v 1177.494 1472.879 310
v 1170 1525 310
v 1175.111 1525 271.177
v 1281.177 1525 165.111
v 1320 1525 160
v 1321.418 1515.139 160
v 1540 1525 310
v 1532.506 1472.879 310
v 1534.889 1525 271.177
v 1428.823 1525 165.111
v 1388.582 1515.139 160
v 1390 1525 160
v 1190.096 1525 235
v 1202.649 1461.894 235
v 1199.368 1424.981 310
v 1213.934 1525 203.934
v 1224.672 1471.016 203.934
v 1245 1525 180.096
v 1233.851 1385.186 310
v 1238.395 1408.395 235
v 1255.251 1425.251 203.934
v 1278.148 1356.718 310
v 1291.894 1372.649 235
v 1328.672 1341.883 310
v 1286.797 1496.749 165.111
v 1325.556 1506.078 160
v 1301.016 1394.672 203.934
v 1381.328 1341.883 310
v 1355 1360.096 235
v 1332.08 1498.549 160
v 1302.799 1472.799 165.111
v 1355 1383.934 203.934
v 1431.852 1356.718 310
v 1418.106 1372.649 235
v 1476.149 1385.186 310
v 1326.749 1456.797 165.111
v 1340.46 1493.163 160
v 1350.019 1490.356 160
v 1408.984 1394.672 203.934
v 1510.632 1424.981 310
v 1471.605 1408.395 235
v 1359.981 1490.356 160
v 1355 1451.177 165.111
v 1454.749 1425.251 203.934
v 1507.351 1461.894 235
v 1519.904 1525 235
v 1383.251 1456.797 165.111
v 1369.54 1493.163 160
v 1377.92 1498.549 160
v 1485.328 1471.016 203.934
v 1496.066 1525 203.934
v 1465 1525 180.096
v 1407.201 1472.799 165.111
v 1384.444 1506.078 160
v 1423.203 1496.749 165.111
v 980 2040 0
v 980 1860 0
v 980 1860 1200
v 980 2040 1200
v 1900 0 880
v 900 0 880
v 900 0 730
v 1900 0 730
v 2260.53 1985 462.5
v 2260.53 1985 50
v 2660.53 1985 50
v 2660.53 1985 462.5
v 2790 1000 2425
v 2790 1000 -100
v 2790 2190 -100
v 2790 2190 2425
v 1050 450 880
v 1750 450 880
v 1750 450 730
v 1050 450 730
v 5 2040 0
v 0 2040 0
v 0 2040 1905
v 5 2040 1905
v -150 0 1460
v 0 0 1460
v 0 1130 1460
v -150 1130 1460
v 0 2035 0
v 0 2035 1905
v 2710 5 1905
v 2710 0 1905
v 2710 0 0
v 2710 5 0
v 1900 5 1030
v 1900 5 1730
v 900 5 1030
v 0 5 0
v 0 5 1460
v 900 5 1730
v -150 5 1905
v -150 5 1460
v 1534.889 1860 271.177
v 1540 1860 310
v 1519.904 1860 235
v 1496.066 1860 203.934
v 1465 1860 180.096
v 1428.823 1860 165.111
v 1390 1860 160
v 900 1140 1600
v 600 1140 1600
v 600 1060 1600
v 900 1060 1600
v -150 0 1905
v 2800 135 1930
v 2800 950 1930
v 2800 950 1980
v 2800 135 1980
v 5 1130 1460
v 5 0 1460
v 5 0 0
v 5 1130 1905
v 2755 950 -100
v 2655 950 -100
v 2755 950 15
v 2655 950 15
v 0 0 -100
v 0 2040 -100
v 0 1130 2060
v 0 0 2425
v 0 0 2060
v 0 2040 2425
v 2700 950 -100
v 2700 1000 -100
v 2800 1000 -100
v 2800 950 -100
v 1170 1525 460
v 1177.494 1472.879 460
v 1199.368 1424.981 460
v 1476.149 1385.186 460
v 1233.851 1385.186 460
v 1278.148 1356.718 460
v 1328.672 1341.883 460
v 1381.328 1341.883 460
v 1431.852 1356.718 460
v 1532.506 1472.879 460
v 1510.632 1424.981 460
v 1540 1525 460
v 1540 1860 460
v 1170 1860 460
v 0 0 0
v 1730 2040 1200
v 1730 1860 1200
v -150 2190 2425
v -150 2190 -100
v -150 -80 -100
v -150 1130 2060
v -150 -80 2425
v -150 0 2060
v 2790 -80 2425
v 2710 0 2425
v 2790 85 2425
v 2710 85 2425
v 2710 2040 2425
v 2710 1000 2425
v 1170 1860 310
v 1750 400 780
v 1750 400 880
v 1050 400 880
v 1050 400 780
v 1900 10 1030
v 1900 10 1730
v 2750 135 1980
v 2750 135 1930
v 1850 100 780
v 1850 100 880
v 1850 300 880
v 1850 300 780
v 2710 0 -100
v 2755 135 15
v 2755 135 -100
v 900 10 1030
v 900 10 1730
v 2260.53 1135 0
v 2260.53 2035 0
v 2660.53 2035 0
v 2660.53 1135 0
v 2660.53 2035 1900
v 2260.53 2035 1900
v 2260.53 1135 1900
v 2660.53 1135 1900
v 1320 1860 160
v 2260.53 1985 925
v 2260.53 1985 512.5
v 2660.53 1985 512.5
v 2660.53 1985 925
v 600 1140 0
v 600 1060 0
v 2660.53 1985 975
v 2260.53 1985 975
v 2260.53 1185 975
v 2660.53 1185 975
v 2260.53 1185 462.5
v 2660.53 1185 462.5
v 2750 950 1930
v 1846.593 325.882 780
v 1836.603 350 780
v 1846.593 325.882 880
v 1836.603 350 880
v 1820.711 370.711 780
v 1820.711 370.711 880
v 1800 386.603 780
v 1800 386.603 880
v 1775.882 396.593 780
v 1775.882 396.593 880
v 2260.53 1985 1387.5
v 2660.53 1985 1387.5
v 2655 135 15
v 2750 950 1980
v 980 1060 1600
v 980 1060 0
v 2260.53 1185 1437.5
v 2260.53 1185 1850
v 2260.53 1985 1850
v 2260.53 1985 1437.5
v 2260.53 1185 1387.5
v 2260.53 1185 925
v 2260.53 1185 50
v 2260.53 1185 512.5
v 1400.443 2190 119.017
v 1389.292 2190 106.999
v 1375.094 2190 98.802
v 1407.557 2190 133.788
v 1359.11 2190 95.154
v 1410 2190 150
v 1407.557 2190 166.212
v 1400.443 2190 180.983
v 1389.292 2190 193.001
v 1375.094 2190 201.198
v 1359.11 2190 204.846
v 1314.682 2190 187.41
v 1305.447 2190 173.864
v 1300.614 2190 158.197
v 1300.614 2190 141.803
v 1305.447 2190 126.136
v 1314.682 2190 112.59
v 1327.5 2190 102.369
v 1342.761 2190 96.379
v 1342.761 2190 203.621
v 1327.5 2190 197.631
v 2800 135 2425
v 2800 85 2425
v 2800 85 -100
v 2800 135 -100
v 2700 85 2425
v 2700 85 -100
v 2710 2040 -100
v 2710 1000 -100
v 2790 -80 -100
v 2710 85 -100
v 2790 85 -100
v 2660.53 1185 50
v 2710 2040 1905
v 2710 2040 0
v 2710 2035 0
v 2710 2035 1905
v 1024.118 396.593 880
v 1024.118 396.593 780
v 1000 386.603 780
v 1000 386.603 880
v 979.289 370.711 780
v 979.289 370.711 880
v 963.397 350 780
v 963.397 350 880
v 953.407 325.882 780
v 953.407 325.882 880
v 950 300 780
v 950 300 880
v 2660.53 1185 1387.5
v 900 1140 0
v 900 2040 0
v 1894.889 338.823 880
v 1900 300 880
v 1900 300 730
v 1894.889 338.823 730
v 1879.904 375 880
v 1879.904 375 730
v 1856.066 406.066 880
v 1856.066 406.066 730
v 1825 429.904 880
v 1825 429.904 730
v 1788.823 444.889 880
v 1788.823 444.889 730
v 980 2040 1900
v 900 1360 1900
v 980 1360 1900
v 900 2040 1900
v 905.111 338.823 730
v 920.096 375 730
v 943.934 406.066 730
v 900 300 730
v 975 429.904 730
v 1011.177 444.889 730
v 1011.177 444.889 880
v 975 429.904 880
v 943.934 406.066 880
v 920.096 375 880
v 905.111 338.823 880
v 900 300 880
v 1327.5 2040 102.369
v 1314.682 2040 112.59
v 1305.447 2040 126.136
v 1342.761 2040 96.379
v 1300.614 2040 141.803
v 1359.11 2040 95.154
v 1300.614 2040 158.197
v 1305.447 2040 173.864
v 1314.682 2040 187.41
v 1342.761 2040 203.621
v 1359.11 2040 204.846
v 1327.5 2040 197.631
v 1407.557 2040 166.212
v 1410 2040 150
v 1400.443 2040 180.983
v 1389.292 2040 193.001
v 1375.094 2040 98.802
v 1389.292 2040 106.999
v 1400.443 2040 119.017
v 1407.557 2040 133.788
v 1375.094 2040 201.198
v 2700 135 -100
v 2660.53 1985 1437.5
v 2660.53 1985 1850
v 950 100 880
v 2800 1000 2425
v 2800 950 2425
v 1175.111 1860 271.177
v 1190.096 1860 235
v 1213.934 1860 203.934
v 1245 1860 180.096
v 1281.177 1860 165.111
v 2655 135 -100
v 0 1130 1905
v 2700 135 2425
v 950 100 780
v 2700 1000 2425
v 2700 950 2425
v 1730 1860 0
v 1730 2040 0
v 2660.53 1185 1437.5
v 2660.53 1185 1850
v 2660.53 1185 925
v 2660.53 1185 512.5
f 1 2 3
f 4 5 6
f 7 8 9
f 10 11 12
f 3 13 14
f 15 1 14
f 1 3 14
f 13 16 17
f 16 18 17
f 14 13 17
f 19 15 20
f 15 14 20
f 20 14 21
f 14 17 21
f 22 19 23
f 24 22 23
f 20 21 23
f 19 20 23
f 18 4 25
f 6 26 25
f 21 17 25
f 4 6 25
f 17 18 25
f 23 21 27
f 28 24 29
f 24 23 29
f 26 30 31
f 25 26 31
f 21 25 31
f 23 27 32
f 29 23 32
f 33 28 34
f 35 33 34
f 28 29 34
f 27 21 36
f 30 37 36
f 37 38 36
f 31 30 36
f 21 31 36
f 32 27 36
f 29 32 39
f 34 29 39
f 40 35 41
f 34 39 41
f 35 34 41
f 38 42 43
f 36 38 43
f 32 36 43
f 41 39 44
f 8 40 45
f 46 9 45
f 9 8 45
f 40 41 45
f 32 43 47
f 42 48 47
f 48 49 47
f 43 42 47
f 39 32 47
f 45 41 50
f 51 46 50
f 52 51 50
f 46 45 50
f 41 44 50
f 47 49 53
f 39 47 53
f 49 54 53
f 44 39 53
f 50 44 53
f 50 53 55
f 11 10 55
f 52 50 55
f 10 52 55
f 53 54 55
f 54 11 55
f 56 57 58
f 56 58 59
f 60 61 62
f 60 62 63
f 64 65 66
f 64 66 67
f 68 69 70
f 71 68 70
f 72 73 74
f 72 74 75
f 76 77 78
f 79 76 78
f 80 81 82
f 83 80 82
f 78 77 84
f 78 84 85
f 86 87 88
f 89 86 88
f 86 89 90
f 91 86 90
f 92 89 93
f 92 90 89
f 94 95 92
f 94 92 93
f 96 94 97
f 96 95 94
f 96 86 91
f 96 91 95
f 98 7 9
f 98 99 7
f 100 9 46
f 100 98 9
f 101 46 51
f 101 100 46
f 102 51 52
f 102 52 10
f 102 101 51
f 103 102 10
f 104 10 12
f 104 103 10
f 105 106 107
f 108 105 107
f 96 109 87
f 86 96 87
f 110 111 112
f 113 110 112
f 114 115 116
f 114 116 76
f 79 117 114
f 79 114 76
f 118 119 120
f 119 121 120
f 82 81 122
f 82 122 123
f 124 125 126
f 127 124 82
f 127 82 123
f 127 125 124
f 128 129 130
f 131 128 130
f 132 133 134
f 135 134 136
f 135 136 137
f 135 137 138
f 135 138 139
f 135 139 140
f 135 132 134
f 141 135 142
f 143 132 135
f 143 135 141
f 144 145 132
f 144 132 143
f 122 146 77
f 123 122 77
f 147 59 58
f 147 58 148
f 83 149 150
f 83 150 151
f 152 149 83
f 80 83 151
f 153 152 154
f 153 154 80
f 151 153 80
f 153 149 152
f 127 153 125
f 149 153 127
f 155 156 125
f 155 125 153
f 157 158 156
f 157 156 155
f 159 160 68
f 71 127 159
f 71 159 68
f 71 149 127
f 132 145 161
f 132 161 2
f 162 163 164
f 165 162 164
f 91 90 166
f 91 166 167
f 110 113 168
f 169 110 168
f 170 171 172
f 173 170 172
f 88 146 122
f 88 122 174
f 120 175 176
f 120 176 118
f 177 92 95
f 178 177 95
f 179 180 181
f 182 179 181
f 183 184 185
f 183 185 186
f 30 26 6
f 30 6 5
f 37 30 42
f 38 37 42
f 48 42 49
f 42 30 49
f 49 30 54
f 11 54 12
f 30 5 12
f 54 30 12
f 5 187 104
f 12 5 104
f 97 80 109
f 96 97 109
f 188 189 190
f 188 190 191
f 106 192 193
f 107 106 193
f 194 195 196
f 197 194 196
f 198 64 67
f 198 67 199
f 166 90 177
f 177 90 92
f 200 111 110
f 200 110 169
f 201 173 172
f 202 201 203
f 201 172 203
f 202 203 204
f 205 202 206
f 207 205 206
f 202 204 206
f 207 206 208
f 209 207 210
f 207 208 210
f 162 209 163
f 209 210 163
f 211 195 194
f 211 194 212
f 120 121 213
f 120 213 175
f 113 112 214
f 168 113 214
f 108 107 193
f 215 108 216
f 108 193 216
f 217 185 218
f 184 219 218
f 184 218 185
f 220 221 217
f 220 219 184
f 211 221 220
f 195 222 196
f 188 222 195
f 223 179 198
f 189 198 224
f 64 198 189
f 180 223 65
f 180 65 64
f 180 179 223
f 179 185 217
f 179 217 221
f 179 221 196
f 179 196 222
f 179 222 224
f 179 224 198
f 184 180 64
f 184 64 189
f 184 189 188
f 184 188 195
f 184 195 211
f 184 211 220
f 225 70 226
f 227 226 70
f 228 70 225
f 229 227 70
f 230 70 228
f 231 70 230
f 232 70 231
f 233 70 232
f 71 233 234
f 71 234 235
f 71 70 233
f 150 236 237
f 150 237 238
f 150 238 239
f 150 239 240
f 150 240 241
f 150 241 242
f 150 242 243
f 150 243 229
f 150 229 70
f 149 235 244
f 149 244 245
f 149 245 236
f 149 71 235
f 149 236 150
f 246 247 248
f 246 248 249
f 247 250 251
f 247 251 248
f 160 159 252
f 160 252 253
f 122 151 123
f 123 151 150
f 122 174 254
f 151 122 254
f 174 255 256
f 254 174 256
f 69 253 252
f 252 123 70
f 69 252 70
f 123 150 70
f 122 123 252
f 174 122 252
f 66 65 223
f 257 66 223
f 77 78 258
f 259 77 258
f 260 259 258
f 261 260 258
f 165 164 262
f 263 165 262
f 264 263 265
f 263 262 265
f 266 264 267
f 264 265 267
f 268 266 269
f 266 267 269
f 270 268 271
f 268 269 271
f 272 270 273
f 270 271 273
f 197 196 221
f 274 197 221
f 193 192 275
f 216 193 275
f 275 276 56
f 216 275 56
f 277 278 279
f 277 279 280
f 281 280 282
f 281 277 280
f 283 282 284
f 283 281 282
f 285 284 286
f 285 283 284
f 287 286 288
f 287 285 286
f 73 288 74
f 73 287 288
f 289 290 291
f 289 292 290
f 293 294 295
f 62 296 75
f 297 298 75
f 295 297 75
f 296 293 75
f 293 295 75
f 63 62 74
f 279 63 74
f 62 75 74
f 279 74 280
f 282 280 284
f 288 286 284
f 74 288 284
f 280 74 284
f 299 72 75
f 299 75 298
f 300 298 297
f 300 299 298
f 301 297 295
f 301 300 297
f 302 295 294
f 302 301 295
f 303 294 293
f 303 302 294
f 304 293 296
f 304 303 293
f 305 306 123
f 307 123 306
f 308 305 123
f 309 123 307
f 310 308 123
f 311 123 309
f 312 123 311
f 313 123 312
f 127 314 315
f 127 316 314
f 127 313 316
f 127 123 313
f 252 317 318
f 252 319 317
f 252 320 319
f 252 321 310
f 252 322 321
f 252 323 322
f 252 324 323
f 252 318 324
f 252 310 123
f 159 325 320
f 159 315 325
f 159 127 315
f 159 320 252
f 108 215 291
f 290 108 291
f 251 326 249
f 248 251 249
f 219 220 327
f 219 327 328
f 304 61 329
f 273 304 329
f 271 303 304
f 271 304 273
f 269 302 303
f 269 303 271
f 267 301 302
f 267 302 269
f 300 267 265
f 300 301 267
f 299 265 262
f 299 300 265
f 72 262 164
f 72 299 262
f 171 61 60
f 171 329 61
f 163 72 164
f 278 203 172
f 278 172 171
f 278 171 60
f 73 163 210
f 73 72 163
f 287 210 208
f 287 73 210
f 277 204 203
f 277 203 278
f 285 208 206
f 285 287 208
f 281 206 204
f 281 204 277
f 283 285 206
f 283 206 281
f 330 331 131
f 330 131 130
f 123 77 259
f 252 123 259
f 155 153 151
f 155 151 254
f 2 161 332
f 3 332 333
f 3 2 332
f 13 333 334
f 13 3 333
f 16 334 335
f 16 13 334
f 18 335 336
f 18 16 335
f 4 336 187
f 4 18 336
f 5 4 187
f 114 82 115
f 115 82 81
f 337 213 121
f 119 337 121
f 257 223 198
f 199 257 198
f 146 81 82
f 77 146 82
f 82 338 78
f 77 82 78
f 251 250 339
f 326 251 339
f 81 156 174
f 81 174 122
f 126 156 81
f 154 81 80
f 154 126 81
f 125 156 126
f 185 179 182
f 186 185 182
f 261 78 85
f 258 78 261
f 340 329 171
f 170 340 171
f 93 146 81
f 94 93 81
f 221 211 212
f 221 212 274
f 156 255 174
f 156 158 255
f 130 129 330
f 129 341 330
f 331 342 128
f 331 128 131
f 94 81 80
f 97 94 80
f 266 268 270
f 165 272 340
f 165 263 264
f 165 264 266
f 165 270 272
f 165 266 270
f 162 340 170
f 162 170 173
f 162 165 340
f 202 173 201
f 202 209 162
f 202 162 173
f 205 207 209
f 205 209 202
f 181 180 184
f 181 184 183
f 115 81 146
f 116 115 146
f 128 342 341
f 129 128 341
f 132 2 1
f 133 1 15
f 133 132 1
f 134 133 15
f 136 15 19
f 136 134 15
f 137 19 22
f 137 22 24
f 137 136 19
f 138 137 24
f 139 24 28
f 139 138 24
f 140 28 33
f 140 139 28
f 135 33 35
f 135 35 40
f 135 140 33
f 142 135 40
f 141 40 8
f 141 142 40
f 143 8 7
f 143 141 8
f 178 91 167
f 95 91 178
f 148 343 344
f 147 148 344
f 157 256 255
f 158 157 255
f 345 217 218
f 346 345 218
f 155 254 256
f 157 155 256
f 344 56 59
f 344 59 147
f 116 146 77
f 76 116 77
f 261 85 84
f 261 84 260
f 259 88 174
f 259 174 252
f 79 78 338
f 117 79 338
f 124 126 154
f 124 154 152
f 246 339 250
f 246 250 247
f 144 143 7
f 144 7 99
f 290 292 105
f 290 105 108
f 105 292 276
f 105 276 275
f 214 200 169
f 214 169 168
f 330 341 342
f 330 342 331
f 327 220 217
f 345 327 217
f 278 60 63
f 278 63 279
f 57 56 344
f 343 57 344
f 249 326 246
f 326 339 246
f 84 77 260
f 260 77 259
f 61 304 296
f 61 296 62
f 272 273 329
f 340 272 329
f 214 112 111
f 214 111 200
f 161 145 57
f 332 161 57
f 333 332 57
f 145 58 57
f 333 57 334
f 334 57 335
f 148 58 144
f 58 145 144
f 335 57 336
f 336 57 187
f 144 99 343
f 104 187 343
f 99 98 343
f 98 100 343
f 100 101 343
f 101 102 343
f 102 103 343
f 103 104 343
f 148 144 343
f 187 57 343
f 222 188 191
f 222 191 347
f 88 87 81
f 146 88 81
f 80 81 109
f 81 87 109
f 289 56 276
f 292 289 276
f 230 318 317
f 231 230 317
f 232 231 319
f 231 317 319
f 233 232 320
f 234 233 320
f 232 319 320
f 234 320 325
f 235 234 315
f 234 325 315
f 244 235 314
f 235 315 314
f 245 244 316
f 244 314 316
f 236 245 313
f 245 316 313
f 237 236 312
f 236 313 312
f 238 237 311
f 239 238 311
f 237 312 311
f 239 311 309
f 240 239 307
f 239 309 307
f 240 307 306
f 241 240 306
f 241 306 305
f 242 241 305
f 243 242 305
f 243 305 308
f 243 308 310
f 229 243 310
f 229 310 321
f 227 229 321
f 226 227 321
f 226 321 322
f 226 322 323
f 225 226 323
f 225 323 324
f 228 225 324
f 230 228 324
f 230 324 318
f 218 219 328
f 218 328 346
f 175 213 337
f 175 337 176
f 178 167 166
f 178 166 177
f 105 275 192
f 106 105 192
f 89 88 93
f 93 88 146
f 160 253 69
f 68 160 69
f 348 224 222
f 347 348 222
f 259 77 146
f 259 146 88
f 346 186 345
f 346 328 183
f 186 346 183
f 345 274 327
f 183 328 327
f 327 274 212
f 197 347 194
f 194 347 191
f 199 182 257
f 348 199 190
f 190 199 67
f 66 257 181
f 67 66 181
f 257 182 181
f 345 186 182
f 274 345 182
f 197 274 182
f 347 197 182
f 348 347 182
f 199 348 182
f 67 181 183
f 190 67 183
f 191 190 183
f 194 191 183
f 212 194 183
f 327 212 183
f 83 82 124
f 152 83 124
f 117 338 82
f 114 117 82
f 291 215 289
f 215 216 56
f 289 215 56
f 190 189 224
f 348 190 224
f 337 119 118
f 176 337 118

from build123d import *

# Parameters (mm, degrees)
F0_W           = 2710
F0_H           = 2040
F1_DEPTH       = 100
F3_DEPTH       = 2425
F3_DEPTH_BACK  = 100
F4_W           = 1130
F4_H           = 600
F5_DEPTH       = 150.001
F6_W           = 100
F6_H           = 50
F7_DEPTH       = 2425
F7_DEPTH_BACK  = 100
F8_W           = 50
F8_H           = 50
F9_DEPTH       = 815
F10_W          = 100
F10_H          = 815
F11_DEPTH      = 15
F11_DEPTH_BACK = 100
F14_DEPTH      = 5
F16_DEPTH      = 5
F17_W          = 2710
F17_H          = 1905
F18_DEPTH      = 5
F19_R          = 55
F20_DEPTH      = 150.001
F21_W          = 750
F21_H          = 180
F22_DEPTH      = 1200
F24_DEPTH      = 1900
F26_DEPTH      = 380
F28_DEPTH      = 300
F31_DEPTH      = 300
F32_R          = 150
F35_DEPTH      = 150
F37_DEPTH      = 100
F38_W          = 400
F38_H          = 900
F39_DEPTH      = 1900
F40_W          = 800
F40_H          = 412.5
F41_DEPTH      = 449.4704246521
F43_W          = 1000
F43_H          = 700
F44_DEPTH      = 5


with BuildPart() as f1:
    # F0 (on Top) → F1 (new body)
    with BuildSketch(Plane.XY):
        with Locations((1355, 1020)):
            Rectangle(F0_W, F0_H)
    extrude(amount=-F1_DEPTH)


with BuildPart() as f3:
    # F2 (on Top) → F3 (new body, two sides)
    with BuildSketch(Plane.XY) as f3_sk:
        Polygon((2710, 85), (2710, 0), (0, 0), (0, 2040), (2710, 2040), (2710, 1000), (2790, 1000), (2790, 2190), (-150, 2190), (-150, -80), (2790, -80), (2790, 85), align=None)
    extrude(amount=F3_DEPTH)
    extrude(f3_sk.sketch, amount=-F3_DEPTH_BACK)

    # F4 (on face) → F5 (cut, through all)
    with BuildSketch(Plane.YZ):
        with Locations((565, 1760)):
            Rectangle(F4_W, F4_H)
    extrude(amount=-F5_DEPTH, mode=Mode.SUBTRACT)

    # F19 (on face) → F20 (cut, through all)
    with BuildSketch(Plane.XZ.offset(-2040)):
        with Locations((1355, 150)):
            Circle(F19_R)
    extrude(amount=-F20_DEPTH, mode=Mode.SUBTRACT)


with BuildPart() as f7:
    # F6 (on face) → F7 (new body, two sides)
    with BuildSketch(Plane.XY) as f7_sk:
        with Locations((2750, 110)):
            Rectangle(F6_W, F6_H)
    extrude(amount=F7_DEPTH)
    extrude(f7_sk.sketch, amount=-F7_DEPTH_BACK)


with BuildPart() as f7b:
    # F6 (on face) → F7, piece 2 (new body, two sides)
    with BuildSketch(Plane.XY) as f7_2_sk:
        with Locations((2750, 975)):
            Rectangle(F6_W, F6_H)
    extrude(amount=F7_DEPTH)
    extrude(f7_2_sk.sketch, amount=-F7_DEPTH_BACK)


with BuildPart() as f9:
    # F8 (on face) → F9 (new body, through all)
    with BuildSketch(Plane(origin=(0, 135, 0), x_dir=(-1, 0, 0), z_dir=(0, 1, 0))):
        with Locations((-2775, 1955)):
            Rectangle(F8_W, F8_H)
    extrude(amount=F9_DEPTH)


with BuildPart() as f11:
    # F10 (on face) → F11 (new body, two sides)
    with BuildSketch(Plane.XY) as f11_sk:
        with Locations((2705, 542.5)):
            Rectangle(F10_W, F10_H)
    extrude(amount=F11_DEPTH)
    extrude(f11_sk.sketch, amount=-F11_DEPTH_BACK)


with BuildPart() as f14:
    # F13 (on face) → F14 (new body)
    with BuildSketch(Plane(origin=(0, 0, 0), x_dir=(-1, 0, 0), z_dir=(0, 1, 0))):
        Polygon((-2710, 1905), (-2710, 0), (0, 0), (0, 1460), (150, 1460), (150, 1905), align=None)
    extrude(amount=F14_DEPTH)

    # F43 (on face) → F44 (join)
    with BuildSketch(Plane(origin=(0, 5, 0), x_dir=(-1, 0, 0), z_dir=(0, 1, 0))):
        with Locations((-1400, 1380)):
            Rectangle(F43_W, F43_H)
    extrude(amount=F44_DEPTH)


with BuildPart() as f16:
    # F15 (on face) → F16 (new body)
    with BuildSketch(Plane.YZ):
        Polygon((2040, 1905), (1130, 1905), (1130, 1460), (0, 1460), (0, 0), (2040, 0), align=None)
    extrude(amount=F16_DEPTH)


with BuildPart() as f18:
    # F17 (on face) → F18 (new body)
    with BuildSketch(Plane.XZ.offset(-2040)):
        with Locations((1355, 952.5)):
            Rectangle(F17_W, F17_H)
    extrude(amount=F18_DEPTH)


with BuildPart() as f22:
    # F21 (on face) → F22 (new body)
    with BuildSketch(Plane.XY):
        with Locations((1355, 1950)):
            Rectangle(F21_W, F21_H)
    extrude(amount=F22_DEPTH)

    # F30 (on offset) → F31 (join)
    with BuildSketch(Plane.XY.offset(460)):
        with BuildLine():
            Line((1540, 1860), (1170, 1860))
            Line((1170, 1860), (1170, 1525))
            ThreePointArc((1170, 1525), (1355, 1340), (1540, 1525))
            Line((1540, 1525), (1540, 1860))
        make_face()
    extrude(amount=-F31_DEPTH)

    # F32
    f32_edges = [f22.edges().sort_by_distance(p)[0] for p in [
        (1540, 1692.5, 160),
        (1355, 1340, 160),
        (1170, 1692.5, 160),
    ]]
    fillet(f32_edges, radius=F32_R)


with BuildPart() as f24:
    # F23 (on face) → F24 (new body)
    with BuildSketch(Plane.XY):
        Polygon((980, 1060), (980, 2040), (900, 2040), (900, 1140), (600, 1140), (600, 1060), align=None)
    extrude(amount=F24_DEPTH)

    # F25 (on face) → F26 (cut, through all)
    with BuildSketch(Plane.YZ.offset(980)):
        Polygon((1360, 1900), (1060, 1900), (1060, 1600), align=None)
    extrude(amount=-F26_DEPTH, mode=Mode.SUBTRACT)

    # F27 (on face) → F28 (cut, through all)
    with BuildSketch(Plane(origin=(600, 0, 0), x_dir=(0, -1, 0), z_dir=(-1, 0, 0))):
        Polygon((-1140, 1600), (-1060, 1600), (-1140, 1680), align=None)
    extrude(amount=-F28_DEPTH, mode=Mode.SUBTRACT)


with BuildPart() as f35:
    # F34 (on offset) → F35 (new body)
    with BuildSketch(Plane.XY.offset(880)):
        with BuildLine():
            Line((900, 300), (900, 0))
            Line((900, 0), (1900, 0))
            Line((1900, 0), (1900, 300))
            ThreePointArc((1900, 300), (1856.066017178, 406.066017178), (1750, 450))
            Line((1750, 450), (1050, 450))
            ThreePointArc((1050, 450), (943.933982822, 406.066017178), (900, 300))
        make_face()
    extrude(amount=-F35_DEPTH)

    # F36 (on face) → F37 (cut)
    with BuildSketch(Plane.XY.offset(880)):
        with BuildLine():
            Line((950, 300), (950, 100))
            Line((950, 100), (1850, 100))
            Line((1850, 100), (1850, 300))
            ThreePointArc((1850, 300), (1820.7106781187, 370.7106781187), (1750, 400))
            Line((1750, 400), (1050, 400))
            ThreePointArc((1050, 400), (979.2893218813, 370.7106781187), (950, 300))
        make_face()
    extrude(amount=-F37_DEPTH, mode=Mode.SUBTRACT)


with BuildPart() as f39:
    # F38 (on face) → F39 (new body)
    with BuildSketch(Plane.XY):
        with Locations((2460.5295753479, 1585)):
            Rectangle(F38_W, F38_H)
    extrude(amount=F39_DEPTH)

    # F40 (on face) → F41 (cut, through all)
    with BuildSketch(Plane(origin=(2260.5295753479, 0, 0), x_dir=(0, -1, 0), z_dir=(-1, 0, 0))):
        with Locations((-1585, 1643.75)):
            Rectangle(F40_W, F40_H)
        with Locations((-1585, 1181.25)):
            Rectangle(F40_W, F40_H)
        with Locations((-1585, 718.75)):
            Rectangle(F40_W, F40_H)
        with Locations((-1585, 256.25)):
            Rectangle(F40_W, F40_H)
    extrude(amount=-F41_DEPTH, mode=Mode.SUBTRACT)


solid = Compound([f1.part, f3.part, f7.part, f7b.part, f9.part, f11.part, f14.part, f16.part, f18.part, f22.part, f24.part, f35.part, f39.part])
